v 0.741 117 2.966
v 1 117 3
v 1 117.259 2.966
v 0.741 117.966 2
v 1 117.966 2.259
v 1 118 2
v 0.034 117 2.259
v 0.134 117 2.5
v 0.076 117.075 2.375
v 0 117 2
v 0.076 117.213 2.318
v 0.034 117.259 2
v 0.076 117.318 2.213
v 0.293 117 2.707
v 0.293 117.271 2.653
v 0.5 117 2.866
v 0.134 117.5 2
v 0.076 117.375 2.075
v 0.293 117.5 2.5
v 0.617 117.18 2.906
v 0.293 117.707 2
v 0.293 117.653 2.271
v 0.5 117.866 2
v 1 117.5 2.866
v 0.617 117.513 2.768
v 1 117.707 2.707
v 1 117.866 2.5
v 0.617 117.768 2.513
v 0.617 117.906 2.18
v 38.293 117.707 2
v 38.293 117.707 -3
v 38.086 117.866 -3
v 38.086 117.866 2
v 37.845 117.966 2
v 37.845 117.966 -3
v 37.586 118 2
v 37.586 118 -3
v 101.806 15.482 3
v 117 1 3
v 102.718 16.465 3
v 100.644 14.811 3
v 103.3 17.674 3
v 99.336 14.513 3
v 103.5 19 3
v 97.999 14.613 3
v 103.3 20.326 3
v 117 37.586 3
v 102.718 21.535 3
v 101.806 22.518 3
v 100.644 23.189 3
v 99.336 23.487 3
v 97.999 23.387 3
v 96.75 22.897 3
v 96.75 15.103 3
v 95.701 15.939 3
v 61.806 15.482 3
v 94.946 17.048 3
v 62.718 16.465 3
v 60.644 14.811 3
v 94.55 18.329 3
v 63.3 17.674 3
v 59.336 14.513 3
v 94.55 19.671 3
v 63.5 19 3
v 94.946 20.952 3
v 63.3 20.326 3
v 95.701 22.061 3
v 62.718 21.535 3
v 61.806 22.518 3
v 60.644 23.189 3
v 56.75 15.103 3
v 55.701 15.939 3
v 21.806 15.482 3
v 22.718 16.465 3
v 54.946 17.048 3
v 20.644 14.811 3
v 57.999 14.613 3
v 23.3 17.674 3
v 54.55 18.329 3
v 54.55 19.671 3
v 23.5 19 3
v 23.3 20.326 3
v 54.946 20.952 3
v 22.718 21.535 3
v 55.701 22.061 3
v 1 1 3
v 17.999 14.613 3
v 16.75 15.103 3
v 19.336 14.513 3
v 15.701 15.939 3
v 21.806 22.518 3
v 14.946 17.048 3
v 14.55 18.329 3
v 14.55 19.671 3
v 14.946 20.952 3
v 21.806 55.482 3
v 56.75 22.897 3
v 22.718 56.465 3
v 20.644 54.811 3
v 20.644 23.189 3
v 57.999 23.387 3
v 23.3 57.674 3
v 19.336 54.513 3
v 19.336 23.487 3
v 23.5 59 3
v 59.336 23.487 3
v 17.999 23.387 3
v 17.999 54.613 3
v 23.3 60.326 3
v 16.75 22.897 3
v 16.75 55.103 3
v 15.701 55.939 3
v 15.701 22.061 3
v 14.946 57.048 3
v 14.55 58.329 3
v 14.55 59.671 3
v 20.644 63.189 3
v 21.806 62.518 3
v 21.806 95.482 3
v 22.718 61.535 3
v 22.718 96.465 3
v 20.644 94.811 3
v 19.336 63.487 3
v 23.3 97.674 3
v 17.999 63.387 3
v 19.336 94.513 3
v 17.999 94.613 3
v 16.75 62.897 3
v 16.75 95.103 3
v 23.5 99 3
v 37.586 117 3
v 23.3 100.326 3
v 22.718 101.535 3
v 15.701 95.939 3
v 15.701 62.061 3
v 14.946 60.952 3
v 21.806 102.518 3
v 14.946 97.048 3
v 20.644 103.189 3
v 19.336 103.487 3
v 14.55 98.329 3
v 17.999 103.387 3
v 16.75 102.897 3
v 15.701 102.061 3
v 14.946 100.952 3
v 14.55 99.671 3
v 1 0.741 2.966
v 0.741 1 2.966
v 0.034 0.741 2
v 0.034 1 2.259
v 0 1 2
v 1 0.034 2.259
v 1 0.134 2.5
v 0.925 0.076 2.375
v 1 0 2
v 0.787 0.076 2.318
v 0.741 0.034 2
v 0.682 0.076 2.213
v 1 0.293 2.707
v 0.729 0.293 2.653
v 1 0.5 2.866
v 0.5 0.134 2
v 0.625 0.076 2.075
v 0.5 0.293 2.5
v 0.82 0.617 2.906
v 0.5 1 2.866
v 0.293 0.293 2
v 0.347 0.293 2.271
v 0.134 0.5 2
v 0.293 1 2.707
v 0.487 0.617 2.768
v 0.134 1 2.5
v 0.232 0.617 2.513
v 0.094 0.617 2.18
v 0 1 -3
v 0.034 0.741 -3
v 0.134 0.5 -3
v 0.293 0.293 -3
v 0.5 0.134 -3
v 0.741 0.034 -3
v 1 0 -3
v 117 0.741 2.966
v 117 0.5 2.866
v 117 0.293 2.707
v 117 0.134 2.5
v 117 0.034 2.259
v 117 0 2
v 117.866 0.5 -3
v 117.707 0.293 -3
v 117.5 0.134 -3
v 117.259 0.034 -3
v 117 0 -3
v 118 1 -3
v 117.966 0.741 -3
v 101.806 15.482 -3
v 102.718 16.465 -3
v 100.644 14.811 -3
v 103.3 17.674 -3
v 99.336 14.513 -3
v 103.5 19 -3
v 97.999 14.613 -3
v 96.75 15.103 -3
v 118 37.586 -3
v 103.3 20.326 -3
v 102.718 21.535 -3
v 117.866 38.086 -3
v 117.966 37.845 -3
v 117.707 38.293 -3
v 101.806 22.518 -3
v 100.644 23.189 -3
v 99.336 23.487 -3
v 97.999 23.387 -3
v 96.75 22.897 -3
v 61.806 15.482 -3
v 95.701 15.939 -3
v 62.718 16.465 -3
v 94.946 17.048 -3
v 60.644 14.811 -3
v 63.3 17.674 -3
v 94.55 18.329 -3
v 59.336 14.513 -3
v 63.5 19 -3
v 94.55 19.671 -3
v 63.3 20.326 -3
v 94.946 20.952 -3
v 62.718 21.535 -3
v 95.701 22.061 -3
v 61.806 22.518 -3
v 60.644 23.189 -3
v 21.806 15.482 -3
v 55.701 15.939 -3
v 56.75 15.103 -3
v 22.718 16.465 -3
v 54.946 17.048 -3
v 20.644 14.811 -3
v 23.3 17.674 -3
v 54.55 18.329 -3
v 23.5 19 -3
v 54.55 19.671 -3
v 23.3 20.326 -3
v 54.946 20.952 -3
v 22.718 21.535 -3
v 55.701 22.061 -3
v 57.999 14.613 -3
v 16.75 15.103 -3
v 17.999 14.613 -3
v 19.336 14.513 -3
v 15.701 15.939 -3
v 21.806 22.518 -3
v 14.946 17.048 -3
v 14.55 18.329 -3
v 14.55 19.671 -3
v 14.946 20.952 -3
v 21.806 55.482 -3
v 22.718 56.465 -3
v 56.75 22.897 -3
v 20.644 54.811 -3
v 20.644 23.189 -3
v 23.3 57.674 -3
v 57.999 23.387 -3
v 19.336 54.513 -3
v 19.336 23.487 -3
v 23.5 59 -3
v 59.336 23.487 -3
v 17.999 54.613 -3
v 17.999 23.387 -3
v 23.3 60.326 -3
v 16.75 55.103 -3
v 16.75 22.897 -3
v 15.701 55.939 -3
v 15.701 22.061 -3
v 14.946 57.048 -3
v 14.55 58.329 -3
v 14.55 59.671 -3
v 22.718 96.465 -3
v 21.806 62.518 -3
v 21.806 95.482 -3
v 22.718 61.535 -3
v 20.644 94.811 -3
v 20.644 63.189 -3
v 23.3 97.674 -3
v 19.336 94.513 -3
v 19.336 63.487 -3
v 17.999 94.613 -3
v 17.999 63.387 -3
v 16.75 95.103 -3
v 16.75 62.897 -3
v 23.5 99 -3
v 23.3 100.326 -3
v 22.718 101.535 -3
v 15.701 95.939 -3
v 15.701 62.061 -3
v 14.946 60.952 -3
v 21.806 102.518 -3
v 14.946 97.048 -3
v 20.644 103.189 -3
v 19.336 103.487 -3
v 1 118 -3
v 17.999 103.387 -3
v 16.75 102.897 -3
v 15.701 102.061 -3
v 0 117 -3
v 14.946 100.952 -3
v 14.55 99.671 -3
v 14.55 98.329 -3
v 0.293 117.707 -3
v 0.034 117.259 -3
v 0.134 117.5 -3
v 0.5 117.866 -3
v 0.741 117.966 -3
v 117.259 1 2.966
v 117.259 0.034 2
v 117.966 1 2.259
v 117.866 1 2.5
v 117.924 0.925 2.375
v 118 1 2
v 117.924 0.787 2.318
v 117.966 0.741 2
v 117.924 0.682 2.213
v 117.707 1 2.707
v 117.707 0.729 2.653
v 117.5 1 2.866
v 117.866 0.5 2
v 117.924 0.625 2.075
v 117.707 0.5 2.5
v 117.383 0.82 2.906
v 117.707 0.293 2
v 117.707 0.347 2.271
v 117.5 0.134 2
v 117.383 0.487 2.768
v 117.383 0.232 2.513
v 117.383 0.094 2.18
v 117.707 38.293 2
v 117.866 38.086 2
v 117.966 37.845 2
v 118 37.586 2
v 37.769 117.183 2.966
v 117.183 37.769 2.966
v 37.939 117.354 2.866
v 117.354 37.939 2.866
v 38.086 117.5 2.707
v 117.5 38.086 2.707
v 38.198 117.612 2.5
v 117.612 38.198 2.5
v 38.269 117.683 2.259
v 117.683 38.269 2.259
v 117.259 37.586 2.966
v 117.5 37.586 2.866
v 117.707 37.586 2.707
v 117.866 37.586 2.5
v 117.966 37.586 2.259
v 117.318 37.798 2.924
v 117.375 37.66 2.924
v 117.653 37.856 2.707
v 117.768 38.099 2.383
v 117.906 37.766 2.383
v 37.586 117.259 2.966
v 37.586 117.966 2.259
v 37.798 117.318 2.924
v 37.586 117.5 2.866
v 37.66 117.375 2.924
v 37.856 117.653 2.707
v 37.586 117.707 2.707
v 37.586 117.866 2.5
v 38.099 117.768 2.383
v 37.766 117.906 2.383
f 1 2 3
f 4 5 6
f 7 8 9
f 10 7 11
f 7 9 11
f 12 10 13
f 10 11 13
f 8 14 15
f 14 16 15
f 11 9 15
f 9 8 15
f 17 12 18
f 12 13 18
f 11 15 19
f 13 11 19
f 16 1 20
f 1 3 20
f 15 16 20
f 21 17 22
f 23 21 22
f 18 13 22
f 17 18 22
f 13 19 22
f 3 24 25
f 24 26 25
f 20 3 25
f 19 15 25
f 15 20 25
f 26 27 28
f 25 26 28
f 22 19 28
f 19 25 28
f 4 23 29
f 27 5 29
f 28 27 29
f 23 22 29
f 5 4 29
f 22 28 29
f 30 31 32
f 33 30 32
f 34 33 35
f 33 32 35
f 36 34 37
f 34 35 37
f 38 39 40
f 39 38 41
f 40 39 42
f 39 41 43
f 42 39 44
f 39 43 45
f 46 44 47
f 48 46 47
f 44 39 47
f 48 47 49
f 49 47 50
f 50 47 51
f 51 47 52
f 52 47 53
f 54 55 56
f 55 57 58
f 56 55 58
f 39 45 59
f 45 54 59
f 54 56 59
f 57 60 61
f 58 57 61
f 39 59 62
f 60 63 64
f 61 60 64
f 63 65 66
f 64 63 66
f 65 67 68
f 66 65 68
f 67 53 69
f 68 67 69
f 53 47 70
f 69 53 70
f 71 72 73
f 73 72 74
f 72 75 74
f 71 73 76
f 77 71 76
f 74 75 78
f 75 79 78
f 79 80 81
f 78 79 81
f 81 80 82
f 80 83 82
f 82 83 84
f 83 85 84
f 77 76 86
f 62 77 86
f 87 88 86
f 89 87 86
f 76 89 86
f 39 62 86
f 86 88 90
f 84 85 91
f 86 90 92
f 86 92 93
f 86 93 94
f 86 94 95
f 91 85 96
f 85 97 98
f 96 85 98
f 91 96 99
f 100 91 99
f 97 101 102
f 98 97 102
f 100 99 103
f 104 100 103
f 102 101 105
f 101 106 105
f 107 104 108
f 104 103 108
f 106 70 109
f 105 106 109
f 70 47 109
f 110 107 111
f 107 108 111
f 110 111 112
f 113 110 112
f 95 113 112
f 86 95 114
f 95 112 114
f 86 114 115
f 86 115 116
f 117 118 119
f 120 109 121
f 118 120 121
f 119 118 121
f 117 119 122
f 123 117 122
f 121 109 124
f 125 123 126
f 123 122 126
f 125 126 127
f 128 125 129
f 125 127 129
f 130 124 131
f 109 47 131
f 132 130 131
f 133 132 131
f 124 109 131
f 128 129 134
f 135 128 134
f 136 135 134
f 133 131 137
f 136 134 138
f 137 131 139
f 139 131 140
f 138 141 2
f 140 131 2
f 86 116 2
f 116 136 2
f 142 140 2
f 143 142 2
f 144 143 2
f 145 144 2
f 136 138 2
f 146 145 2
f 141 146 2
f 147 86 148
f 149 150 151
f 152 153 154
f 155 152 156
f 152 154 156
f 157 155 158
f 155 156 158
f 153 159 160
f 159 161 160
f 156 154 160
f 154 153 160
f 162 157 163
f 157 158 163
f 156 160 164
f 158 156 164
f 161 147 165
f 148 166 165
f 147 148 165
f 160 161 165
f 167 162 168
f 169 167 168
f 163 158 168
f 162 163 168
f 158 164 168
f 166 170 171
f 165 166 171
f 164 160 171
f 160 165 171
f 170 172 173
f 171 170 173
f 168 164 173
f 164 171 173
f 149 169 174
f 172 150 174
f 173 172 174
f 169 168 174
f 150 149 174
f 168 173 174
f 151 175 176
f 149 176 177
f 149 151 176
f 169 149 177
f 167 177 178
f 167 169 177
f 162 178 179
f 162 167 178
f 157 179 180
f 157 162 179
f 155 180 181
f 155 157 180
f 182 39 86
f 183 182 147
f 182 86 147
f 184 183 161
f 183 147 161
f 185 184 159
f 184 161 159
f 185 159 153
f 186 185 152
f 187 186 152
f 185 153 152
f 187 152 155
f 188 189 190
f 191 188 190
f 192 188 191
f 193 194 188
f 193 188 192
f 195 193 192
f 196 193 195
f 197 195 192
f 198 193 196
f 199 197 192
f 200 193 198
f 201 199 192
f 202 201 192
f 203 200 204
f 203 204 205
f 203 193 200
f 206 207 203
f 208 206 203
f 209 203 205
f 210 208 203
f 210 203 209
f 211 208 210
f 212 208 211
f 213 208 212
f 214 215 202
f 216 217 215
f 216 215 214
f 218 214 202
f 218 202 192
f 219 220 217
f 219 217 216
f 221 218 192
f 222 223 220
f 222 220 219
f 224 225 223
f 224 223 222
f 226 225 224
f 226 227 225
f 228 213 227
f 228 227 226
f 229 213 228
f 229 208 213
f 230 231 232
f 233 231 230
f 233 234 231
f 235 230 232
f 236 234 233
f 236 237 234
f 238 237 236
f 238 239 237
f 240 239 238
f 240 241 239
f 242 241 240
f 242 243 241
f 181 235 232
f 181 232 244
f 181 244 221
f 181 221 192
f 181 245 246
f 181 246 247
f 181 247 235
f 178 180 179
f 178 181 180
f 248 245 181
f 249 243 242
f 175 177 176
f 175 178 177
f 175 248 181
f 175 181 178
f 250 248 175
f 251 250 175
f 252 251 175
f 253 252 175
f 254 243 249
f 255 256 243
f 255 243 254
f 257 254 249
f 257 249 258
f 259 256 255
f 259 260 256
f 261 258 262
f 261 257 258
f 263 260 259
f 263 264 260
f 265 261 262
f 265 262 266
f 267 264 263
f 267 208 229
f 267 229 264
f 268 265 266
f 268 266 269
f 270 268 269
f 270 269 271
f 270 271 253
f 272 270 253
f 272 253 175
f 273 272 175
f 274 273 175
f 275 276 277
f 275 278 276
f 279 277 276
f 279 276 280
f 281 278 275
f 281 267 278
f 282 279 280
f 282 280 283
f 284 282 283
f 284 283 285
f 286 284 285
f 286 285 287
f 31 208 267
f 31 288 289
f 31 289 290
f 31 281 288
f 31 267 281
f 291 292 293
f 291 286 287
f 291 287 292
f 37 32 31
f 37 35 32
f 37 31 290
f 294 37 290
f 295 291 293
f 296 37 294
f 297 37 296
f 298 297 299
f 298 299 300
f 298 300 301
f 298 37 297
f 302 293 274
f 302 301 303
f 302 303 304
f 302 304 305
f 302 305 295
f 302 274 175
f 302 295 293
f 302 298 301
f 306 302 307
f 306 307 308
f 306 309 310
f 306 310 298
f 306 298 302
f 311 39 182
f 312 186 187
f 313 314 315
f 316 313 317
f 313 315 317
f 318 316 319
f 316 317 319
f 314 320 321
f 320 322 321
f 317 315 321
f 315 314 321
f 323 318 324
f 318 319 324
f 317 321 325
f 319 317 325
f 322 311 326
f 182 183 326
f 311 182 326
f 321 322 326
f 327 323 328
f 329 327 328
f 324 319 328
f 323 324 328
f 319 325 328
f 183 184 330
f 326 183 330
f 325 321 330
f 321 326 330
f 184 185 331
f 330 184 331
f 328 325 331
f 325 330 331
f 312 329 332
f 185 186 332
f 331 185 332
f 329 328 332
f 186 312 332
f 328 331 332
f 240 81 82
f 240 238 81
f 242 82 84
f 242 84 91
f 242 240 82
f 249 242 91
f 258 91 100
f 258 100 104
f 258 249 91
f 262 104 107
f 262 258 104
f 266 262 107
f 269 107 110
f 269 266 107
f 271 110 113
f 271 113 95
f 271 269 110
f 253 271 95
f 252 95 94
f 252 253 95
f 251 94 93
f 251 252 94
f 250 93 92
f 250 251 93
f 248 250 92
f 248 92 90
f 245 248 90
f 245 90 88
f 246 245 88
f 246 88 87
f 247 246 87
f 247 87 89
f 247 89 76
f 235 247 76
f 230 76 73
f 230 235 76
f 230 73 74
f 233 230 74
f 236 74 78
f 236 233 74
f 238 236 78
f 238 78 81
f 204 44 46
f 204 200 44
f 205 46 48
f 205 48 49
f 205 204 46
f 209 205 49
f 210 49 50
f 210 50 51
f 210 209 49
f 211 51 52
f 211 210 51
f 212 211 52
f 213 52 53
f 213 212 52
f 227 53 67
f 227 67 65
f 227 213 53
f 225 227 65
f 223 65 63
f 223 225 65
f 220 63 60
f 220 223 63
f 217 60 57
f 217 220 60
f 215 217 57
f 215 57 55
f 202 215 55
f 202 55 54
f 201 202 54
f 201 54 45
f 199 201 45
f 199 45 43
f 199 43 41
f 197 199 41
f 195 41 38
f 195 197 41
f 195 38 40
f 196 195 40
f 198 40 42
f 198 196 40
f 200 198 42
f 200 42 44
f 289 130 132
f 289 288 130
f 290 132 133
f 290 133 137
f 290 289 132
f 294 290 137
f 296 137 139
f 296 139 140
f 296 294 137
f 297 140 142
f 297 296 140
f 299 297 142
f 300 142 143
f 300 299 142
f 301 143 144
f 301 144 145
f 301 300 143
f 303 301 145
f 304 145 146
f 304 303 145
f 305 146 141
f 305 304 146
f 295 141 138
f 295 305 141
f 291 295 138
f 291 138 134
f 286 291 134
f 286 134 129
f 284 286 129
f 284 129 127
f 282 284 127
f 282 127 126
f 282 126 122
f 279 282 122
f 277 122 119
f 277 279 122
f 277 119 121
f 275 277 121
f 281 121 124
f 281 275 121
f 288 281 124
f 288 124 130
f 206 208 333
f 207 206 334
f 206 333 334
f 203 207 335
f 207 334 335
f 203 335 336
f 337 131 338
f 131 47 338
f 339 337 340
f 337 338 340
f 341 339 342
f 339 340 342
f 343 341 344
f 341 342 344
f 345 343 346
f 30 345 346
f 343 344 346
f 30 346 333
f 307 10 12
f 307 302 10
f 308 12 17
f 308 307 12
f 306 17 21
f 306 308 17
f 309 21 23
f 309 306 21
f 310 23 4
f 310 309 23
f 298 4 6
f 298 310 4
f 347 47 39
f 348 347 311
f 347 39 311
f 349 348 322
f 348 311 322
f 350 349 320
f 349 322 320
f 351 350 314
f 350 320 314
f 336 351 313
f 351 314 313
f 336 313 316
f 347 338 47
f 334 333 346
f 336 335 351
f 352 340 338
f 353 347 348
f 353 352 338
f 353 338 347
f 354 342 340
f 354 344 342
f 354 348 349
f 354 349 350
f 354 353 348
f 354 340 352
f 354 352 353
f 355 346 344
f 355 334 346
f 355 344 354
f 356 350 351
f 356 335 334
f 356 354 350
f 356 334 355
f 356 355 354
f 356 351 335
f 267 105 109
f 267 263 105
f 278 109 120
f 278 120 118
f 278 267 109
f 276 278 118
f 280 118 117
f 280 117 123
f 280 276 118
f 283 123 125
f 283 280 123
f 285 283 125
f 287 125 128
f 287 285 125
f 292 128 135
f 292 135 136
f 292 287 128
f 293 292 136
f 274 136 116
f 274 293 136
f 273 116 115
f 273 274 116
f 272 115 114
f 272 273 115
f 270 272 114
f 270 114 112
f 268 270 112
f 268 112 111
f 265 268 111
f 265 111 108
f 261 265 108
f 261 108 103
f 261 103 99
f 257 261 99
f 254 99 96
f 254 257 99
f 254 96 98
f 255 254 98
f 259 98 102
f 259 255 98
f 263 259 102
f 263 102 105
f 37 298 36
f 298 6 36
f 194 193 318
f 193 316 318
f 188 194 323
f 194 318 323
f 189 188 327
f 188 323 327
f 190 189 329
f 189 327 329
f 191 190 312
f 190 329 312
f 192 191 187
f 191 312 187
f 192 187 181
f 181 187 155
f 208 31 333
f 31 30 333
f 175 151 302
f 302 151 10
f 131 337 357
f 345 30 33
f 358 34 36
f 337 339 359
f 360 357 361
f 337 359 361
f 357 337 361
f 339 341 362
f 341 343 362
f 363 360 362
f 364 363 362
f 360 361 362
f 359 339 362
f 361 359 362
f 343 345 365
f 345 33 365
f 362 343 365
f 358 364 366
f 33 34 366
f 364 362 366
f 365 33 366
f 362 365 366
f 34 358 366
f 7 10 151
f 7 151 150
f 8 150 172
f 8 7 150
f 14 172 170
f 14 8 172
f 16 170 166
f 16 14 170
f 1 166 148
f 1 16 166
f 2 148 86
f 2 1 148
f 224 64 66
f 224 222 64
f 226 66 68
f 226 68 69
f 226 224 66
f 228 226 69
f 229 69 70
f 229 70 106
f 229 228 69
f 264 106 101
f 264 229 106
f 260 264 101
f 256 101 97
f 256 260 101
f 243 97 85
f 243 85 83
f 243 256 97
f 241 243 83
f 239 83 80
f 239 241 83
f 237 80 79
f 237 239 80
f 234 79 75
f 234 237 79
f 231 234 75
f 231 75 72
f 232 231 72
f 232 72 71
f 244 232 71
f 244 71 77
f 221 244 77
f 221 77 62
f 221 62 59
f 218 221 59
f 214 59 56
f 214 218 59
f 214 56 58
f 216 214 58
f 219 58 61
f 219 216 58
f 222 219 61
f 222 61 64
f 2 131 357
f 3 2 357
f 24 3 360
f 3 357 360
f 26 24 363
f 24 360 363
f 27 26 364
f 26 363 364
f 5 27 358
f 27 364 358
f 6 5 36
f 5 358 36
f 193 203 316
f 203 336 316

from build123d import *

# Parameters (mm, degrees)
SKETCH1_R           = 4.5
BOSS_EXTRUDE1_DEPTH = 3
FILLET1_R           = 1


with BuildPart() as part:
    # Sketch1 → Boss-Extrude1 (new, symmetric)
    with BuildSketch(Plane.XY):
        Polygon((0, 0), (0, 118), (38, 118), (118, 38), (118, 0), align=None)
        with Locations((19, 19)):
            Circle(SKETCH1_R, mode=Mode.SUBTRACT)
        with Locations((59, 19)):
            Circle(SKETCH1_R, mode=Mode.SUBTRACT)
        with Locations((99, 19)):
            Circle(SKETCH1_R, mode=Mode.SUBTRACT)
        with Locations((19, 59)):
            Circle(SKETCH1_R, mode=Mode.SUBTRACT)
        with Locations((19, 99)):
            Circle(SKETCH1_R, mode=Mode.SUBTRACT)
    extrude(amount=BOSS_EXTRUDE1_DEPTH, both=True)

    # Fillet1
    fillet1_edges = [part.edges().sort_by_distance(p)[0] for p in [
        (78, 78, 3),
        (19, 118, 3),
        (0, 59, 3),
        (59, 0, 3),
        (118, 19, 3),
        (0, 0, 0),
        (0, 118, 0),
        (38, 118, 0),
        (118, 38, 0),
        (118, 0, 0),
    ]]
    fillet(fillet1_edges, radius=FILLET1_R)


solid = part.part
